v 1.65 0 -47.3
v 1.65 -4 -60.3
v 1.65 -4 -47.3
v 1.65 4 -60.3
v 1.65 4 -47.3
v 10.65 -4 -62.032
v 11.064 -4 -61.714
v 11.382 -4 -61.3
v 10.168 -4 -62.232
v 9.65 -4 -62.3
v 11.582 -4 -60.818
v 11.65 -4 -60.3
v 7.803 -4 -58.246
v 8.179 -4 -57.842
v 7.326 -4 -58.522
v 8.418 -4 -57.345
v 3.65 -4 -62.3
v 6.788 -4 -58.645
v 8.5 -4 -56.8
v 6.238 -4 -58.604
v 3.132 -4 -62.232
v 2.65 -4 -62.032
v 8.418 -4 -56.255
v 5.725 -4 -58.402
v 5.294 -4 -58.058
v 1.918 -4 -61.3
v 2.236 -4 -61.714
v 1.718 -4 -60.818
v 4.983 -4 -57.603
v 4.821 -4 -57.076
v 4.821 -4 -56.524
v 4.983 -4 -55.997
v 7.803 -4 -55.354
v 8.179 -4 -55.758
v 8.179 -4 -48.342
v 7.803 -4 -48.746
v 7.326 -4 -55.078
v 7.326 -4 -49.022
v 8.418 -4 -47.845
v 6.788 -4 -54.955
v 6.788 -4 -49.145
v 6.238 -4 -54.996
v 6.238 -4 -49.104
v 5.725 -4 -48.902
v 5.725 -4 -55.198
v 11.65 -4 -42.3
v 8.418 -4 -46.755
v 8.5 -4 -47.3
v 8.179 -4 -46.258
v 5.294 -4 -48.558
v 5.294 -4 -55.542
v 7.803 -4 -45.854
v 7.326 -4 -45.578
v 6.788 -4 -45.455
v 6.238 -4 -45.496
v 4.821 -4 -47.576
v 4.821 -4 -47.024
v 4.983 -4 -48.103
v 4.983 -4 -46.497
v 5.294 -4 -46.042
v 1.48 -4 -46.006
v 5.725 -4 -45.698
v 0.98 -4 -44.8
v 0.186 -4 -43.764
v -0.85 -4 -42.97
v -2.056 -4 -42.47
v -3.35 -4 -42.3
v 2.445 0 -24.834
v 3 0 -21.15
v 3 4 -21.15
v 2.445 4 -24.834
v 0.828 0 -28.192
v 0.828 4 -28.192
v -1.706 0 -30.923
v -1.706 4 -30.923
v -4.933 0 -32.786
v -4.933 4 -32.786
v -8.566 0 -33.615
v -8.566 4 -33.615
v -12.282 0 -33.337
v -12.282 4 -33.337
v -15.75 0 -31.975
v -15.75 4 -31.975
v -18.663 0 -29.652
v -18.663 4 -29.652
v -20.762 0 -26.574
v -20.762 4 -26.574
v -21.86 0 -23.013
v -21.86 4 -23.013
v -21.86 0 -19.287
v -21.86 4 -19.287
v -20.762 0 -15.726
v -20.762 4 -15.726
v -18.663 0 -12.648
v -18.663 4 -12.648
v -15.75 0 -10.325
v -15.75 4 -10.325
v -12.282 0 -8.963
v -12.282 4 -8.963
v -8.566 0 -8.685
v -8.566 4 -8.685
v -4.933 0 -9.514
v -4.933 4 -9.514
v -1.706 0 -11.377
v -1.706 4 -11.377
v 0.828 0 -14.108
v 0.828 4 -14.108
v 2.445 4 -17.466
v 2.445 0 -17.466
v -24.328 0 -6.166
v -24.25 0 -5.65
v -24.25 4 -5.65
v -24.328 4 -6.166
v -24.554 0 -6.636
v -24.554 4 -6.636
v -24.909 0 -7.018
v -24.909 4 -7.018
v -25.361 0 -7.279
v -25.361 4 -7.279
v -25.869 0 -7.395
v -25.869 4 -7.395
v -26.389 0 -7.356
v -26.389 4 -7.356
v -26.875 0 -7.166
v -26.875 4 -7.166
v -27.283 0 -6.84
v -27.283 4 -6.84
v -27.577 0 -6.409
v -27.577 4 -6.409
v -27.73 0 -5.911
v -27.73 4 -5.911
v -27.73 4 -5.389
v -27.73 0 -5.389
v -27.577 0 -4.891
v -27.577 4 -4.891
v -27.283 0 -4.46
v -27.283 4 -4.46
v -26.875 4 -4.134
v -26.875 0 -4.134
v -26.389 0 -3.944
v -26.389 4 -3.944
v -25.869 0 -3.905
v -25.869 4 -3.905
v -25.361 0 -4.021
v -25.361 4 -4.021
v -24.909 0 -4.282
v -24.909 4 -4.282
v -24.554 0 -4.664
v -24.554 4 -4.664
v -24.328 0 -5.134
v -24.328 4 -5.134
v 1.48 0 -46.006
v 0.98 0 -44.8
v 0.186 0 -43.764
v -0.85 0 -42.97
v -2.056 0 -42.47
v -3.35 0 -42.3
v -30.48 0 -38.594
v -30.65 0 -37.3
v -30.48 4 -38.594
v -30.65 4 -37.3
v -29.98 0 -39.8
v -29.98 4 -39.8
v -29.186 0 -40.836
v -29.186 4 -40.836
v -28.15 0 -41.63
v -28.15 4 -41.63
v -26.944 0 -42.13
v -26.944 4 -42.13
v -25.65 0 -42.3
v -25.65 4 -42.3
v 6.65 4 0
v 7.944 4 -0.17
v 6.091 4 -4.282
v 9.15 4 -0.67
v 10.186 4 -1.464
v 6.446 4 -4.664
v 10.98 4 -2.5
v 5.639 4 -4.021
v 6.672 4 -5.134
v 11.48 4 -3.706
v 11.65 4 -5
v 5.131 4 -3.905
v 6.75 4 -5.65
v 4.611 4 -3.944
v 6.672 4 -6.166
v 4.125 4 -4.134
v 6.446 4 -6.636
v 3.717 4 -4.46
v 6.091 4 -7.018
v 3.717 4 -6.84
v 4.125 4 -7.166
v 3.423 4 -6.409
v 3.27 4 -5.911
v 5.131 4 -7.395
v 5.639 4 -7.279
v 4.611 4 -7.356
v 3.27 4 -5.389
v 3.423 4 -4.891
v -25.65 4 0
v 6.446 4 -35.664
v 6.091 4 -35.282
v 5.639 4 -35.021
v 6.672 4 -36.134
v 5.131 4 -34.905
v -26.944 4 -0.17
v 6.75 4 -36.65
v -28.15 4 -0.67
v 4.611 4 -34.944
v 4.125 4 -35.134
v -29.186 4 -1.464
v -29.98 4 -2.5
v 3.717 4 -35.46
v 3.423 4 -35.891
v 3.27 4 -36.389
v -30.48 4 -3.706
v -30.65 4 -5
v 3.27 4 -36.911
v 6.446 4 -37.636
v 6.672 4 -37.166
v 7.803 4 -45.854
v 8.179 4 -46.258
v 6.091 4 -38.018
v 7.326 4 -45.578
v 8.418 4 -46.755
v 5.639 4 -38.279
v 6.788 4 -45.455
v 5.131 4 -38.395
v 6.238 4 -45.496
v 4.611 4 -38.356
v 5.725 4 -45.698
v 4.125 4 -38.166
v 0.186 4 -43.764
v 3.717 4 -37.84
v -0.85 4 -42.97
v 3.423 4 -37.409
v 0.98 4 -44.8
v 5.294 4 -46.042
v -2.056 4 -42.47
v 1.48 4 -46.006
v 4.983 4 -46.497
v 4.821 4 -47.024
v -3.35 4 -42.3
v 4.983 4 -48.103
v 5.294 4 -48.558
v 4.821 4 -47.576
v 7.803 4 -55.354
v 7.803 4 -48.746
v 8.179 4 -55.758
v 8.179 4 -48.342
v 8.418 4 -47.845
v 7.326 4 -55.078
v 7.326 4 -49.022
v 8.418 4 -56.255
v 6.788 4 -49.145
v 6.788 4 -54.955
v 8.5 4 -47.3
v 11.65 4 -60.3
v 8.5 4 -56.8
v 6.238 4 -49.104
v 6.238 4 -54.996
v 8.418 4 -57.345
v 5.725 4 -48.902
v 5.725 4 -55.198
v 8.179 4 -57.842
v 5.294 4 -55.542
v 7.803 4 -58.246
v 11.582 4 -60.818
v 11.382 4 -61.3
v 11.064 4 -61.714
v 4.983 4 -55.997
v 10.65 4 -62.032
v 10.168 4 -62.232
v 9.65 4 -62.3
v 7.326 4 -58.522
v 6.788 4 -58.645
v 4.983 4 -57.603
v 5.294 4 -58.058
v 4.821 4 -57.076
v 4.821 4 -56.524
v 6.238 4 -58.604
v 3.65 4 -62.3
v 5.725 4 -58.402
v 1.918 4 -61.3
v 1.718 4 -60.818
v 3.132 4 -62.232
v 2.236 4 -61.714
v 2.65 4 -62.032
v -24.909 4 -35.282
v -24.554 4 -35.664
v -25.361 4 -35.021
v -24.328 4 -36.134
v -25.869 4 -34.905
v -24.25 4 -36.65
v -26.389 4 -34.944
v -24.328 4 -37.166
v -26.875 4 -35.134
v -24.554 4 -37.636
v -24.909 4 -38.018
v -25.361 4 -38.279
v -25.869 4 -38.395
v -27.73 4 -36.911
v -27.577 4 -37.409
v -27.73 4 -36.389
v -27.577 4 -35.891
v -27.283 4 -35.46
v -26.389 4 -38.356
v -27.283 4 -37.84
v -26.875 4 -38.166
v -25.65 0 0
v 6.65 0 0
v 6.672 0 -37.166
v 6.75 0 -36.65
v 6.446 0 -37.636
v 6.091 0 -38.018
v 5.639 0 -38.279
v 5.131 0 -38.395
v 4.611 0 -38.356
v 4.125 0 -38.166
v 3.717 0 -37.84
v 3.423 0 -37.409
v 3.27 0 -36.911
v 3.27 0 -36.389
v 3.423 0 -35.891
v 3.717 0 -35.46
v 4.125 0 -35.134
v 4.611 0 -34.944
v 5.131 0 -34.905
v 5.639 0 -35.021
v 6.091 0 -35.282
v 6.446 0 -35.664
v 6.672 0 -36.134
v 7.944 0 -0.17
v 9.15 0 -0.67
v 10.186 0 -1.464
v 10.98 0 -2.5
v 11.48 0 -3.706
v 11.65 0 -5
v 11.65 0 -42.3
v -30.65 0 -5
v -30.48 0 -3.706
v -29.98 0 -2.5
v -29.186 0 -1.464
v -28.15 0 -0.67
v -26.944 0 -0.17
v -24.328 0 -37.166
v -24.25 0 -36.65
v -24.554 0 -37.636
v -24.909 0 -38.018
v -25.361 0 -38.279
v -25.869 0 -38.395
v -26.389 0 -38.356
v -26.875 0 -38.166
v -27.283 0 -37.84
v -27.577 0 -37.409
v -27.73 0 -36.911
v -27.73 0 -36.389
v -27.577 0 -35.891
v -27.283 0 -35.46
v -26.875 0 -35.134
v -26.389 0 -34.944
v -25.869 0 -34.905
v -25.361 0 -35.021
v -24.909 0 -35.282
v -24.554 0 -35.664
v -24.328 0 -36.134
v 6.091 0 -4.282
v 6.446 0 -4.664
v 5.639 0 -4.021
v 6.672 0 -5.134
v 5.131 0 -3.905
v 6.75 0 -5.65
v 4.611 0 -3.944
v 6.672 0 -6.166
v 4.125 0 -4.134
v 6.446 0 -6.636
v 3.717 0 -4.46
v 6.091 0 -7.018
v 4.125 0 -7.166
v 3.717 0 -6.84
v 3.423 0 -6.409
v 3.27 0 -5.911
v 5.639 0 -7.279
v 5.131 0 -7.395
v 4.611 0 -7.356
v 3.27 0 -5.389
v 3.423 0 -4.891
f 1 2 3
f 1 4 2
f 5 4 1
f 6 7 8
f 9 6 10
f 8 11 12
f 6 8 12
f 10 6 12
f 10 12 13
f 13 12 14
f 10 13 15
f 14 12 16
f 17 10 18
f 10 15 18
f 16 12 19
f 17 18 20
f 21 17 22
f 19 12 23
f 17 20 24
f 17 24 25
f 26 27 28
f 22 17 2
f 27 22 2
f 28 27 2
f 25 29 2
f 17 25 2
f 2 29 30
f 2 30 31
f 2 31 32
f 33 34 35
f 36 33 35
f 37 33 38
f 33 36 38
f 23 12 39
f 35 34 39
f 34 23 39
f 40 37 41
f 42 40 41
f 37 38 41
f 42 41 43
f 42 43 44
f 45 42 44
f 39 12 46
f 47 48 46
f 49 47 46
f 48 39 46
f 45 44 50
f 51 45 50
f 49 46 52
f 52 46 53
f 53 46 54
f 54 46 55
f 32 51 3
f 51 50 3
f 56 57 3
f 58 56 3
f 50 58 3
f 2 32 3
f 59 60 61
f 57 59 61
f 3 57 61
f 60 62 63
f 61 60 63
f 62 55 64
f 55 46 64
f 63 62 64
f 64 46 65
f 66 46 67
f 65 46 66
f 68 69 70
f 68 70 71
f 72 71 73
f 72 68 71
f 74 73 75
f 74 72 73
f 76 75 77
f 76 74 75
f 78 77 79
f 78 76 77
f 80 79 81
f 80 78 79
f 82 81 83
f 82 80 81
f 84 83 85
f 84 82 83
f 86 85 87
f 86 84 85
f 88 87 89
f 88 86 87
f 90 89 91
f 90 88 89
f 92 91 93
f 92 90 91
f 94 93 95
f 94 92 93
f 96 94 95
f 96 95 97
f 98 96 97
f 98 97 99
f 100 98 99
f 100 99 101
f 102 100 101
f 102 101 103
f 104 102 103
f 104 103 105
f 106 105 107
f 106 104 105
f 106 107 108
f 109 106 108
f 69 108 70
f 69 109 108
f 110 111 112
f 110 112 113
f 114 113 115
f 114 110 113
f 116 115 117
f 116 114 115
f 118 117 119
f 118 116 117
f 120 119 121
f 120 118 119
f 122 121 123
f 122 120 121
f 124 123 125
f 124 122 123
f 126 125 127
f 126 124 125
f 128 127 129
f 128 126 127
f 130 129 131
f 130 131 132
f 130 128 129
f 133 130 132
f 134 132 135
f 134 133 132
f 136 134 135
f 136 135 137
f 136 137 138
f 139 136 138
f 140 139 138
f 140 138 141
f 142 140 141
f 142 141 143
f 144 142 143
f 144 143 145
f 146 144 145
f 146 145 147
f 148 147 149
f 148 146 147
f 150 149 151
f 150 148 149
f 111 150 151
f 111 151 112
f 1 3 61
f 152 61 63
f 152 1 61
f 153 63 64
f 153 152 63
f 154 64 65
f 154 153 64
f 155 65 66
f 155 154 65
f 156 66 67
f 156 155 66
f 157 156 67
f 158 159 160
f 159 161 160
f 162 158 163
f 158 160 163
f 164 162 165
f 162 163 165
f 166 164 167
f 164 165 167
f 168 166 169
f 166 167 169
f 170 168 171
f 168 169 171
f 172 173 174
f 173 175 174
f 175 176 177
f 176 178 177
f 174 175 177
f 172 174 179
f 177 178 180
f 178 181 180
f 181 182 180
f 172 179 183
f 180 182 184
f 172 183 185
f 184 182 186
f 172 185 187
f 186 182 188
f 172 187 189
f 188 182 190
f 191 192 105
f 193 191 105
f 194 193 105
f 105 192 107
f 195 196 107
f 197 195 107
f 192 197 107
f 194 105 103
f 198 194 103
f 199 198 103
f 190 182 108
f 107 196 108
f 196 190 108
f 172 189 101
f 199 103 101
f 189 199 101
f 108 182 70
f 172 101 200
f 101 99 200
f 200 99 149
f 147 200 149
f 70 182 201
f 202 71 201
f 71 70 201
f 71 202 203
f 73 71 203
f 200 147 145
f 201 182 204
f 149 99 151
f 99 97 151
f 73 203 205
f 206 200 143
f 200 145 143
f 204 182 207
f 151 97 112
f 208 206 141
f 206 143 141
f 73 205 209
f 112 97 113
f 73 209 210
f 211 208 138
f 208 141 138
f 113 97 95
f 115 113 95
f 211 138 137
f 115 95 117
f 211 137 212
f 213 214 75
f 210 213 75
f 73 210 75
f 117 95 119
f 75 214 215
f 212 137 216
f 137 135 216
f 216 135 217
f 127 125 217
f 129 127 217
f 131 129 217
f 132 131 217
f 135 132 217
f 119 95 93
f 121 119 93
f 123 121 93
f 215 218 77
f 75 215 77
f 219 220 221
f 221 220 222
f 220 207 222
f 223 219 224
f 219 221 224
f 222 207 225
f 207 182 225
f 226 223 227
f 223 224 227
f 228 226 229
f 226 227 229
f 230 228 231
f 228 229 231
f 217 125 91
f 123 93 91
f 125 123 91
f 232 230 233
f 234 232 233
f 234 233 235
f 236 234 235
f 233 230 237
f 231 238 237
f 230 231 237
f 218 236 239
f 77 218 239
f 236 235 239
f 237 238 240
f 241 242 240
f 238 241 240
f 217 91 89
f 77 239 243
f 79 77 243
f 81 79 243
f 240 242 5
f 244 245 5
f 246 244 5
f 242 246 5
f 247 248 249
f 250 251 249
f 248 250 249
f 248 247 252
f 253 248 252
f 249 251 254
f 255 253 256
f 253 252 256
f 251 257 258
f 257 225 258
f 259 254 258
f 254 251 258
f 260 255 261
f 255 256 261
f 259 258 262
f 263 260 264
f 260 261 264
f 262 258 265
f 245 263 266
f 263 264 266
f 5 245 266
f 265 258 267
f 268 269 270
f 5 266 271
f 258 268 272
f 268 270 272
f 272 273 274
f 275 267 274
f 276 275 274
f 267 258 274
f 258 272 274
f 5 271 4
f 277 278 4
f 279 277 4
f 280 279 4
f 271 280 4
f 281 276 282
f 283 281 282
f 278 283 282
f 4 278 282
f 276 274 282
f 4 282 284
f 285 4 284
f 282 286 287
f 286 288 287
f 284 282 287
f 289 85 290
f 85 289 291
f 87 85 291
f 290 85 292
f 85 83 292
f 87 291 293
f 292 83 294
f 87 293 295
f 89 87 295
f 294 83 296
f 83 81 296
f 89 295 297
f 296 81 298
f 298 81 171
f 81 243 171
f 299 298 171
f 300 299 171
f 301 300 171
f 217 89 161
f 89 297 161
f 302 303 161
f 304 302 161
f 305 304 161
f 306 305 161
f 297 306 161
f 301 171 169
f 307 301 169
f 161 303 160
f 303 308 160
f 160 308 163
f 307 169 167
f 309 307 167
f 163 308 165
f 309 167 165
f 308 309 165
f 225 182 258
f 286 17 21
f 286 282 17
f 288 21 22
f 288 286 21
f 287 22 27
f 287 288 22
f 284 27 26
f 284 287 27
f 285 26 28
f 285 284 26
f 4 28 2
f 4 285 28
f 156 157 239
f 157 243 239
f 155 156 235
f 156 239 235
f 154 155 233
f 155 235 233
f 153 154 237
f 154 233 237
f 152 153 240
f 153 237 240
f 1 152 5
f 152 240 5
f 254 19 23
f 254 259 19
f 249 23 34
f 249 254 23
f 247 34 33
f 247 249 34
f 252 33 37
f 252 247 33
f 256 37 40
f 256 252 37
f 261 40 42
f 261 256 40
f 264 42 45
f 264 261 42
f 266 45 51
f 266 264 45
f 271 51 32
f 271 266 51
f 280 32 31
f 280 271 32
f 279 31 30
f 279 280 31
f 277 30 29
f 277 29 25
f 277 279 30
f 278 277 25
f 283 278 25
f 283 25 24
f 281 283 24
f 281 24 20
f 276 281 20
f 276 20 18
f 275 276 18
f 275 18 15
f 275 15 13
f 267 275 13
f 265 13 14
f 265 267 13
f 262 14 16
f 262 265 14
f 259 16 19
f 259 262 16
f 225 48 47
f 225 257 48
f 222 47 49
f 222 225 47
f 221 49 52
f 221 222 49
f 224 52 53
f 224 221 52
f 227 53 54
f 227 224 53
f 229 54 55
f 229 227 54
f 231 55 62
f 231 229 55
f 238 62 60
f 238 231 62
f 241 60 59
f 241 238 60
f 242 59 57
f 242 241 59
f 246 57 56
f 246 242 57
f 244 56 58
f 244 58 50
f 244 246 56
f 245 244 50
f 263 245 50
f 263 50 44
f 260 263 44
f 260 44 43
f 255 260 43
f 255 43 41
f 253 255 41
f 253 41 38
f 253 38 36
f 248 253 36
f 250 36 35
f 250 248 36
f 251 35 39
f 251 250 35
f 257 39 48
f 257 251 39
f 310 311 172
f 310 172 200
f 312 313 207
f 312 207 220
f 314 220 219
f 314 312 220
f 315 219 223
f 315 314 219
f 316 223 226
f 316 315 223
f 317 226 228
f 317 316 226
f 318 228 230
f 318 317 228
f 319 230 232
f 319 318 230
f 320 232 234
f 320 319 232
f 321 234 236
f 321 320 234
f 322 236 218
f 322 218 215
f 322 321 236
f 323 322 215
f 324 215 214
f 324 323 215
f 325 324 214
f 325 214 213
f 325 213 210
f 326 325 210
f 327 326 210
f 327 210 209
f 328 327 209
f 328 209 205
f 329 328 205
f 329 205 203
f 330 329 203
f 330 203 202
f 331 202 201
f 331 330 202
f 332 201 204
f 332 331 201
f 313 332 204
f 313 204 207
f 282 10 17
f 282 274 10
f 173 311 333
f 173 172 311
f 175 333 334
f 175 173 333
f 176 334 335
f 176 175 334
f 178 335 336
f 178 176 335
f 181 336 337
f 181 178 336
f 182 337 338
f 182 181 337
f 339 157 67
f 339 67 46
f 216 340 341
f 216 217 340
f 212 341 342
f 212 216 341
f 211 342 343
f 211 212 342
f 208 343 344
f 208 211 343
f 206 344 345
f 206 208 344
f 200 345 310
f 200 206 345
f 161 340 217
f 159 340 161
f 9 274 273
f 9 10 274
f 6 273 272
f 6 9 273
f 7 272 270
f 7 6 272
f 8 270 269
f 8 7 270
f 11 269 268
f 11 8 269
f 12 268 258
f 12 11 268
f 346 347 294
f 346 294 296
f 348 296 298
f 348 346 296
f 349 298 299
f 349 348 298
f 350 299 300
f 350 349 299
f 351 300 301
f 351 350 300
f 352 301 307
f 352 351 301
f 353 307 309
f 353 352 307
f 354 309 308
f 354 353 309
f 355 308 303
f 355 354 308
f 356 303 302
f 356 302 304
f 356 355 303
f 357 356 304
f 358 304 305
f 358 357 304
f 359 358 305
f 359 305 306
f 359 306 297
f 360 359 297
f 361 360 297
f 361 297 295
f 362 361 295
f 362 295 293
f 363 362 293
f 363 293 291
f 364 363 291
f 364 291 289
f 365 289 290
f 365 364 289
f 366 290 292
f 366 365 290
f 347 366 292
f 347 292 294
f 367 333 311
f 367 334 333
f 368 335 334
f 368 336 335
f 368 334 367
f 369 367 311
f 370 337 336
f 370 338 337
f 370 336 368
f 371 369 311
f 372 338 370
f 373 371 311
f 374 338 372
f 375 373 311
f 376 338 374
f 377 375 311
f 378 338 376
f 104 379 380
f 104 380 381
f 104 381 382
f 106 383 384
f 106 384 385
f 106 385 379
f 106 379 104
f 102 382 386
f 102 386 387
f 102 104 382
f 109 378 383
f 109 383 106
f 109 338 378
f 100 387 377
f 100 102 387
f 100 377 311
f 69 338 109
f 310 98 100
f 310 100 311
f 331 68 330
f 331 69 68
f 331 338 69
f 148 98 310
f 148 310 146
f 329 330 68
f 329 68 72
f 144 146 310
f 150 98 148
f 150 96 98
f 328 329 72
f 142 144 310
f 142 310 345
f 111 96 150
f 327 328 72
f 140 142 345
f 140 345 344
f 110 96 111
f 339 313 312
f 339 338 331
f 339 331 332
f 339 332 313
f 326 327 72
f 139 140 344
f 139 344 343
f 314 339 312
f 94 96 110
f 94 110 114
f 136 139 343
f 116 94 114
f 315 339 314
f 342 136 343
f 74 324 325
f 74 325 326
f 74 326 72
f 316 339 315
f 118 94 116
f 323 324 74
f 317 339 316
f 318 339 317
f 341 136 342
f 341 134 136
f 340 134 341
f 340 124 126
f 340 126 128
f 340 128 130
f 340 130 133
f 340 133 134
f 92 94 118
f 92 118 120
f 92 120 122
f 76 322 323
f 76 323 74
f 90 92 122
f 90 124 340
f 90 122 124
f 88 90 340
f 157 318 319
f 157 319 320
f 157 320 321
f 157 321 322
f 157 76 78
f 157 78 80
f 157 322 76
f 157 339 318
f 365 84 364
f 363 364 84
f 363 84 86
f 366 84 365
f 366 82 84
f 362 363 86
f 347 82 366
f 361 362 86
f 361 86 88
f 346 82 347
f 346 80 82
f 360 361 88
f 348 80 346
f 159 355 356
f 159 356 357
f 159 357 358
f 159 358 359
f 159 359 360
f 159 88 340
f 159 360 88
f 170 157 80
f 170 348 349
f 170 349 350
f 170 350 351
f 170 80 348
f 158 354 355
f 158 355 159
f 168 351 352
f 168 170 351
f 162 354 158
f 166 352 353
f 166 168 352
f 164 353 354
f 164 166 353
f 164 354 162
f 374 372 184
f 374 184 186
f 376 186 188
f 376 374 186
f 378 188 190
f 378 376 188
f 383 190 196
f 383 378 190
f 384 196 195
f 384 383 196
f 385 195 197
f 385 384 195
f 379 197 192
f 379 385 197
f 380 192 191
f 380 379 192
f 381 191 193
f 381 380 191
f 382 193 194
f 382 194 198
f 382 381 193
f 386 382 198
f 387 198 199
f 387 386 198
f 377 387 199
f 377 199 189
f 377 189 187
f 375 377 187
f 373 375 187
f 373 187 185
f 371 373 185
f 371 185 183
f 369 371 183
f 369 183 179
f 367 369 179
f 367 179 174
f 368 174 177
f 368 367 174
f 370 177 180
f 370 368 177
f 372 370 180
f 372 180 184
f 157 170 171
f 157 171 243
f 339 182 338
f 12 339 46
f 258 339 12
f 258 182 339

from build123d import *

# Parameters (mm, degrees)
SKETCH2_R           = 1.75
SKETCH2_R_2         = 12.5
SKETCH2_R_3         = 1.85
BOSS_EXTRUDE1_DEPTH = 4
FILLET1_R           = 5
FILLET8_R           = 5
SKETCH5_R           = 1.85
BOSS_EXTRUDE2_DEPTH = 4
FILLET10_R          = 2


with BuildPart() as part:
    # Sketch2 → Boss-Extrude1 (new body)
    with BuildSketch(Plane(origin=(0, 0, 0), x_dir=(1, 0, 0), z_dir=(0, 1, 0))):
        Polygon((-30.65, 0), (-30.65, 42.3), (1.65, 42.3), (1.65, 62.3), (11.65, 62.3), (11.65, 42.3), (11.65, 0), align=None)
        with Locations((5, 5.65)):
            Circle(SKETCH2_R, mode=Mode.SUBTRACT)
        with Locations((5, 36.65)):
            Circle(SKETCH2_R, mode=Mode.SUBTRACT)
        with Locations((-26, 5.65)):
            Circle(SKETCH2_R, mode=Mode.SUBTRACT)
        with Locations((-26, 36.65)):
            Circle(SKETCH2_R, mode=Mode.SUBTRACT)
        with Locations((-9.5, 21.15)):
            Circle(SKETCH2_R_2, mode=Mode.SUBTRACT)
        with Locations((6.65, 56.8)):
            Circle(SKETCH2_R_3, mode=Mode.SUBTRACT)
        with Locations((6.65, 47.3)):
            Circle(SKETCH2_R_3, mode=Mode.SUBTRACT)
    extrude(amount=BOSS_EXTRUDE1_DEPTH)

    # Fillet1
    fillet1_edges = [part.edges().sort_by_distance(p)[0] for p in [
        (11.65, 2, 0),
        (-30.65, 2, 0),
        (-30.65, 2, -42.3),
    ]]
    fillet(fillet1_edges, radius=FILLET1_R)

    # Fillet8
    fillet8_edges = [part.edges().sort_by_distance(p)[0] for p in [
        (1.65, 2, -42.3),
    ]]
    fillet(fillet8_edges, radius=FILLET8_R)

    # Sketch5 → Boss-Extrude2 (add)
    with BuildSketch(Plane.XZ):
        with BuildLine():
            Line((11.65, -62.3), (1.65, -62.3))
            Line((1.65, -62.3), (1.65, -47.3))
            ThreePointArc((1.65, -47.3), (0.185533906, -43.764466094), (-3.35, -42.3))
            Line((-3.35, -42.3), (11.65, -42.3))
            Line((11.65, -42.3), (11.65, -62.3))
        make_face()
        with Locations((6.65, -47.3)):
            Circle(SKETCH5_R, mode=Mode.SUBTRACT)
        with Locations((6.65, -56.8)):
            Circle(SKETCH5_R, mode=Mode.SUBTRACT)
    extrude(amount=BOSS_EXTRUDE2_DEPTH)

    # Fillet10
    fillet10_edges = [part.edges().sort_by_distance(p)[0] for p in [
        (1.65, 0, -62.3),
        (11.65, 0, -62.3),
    ]]
    fillet(fillet10_edges, radius=FILLET10_R)


solid = part.part
